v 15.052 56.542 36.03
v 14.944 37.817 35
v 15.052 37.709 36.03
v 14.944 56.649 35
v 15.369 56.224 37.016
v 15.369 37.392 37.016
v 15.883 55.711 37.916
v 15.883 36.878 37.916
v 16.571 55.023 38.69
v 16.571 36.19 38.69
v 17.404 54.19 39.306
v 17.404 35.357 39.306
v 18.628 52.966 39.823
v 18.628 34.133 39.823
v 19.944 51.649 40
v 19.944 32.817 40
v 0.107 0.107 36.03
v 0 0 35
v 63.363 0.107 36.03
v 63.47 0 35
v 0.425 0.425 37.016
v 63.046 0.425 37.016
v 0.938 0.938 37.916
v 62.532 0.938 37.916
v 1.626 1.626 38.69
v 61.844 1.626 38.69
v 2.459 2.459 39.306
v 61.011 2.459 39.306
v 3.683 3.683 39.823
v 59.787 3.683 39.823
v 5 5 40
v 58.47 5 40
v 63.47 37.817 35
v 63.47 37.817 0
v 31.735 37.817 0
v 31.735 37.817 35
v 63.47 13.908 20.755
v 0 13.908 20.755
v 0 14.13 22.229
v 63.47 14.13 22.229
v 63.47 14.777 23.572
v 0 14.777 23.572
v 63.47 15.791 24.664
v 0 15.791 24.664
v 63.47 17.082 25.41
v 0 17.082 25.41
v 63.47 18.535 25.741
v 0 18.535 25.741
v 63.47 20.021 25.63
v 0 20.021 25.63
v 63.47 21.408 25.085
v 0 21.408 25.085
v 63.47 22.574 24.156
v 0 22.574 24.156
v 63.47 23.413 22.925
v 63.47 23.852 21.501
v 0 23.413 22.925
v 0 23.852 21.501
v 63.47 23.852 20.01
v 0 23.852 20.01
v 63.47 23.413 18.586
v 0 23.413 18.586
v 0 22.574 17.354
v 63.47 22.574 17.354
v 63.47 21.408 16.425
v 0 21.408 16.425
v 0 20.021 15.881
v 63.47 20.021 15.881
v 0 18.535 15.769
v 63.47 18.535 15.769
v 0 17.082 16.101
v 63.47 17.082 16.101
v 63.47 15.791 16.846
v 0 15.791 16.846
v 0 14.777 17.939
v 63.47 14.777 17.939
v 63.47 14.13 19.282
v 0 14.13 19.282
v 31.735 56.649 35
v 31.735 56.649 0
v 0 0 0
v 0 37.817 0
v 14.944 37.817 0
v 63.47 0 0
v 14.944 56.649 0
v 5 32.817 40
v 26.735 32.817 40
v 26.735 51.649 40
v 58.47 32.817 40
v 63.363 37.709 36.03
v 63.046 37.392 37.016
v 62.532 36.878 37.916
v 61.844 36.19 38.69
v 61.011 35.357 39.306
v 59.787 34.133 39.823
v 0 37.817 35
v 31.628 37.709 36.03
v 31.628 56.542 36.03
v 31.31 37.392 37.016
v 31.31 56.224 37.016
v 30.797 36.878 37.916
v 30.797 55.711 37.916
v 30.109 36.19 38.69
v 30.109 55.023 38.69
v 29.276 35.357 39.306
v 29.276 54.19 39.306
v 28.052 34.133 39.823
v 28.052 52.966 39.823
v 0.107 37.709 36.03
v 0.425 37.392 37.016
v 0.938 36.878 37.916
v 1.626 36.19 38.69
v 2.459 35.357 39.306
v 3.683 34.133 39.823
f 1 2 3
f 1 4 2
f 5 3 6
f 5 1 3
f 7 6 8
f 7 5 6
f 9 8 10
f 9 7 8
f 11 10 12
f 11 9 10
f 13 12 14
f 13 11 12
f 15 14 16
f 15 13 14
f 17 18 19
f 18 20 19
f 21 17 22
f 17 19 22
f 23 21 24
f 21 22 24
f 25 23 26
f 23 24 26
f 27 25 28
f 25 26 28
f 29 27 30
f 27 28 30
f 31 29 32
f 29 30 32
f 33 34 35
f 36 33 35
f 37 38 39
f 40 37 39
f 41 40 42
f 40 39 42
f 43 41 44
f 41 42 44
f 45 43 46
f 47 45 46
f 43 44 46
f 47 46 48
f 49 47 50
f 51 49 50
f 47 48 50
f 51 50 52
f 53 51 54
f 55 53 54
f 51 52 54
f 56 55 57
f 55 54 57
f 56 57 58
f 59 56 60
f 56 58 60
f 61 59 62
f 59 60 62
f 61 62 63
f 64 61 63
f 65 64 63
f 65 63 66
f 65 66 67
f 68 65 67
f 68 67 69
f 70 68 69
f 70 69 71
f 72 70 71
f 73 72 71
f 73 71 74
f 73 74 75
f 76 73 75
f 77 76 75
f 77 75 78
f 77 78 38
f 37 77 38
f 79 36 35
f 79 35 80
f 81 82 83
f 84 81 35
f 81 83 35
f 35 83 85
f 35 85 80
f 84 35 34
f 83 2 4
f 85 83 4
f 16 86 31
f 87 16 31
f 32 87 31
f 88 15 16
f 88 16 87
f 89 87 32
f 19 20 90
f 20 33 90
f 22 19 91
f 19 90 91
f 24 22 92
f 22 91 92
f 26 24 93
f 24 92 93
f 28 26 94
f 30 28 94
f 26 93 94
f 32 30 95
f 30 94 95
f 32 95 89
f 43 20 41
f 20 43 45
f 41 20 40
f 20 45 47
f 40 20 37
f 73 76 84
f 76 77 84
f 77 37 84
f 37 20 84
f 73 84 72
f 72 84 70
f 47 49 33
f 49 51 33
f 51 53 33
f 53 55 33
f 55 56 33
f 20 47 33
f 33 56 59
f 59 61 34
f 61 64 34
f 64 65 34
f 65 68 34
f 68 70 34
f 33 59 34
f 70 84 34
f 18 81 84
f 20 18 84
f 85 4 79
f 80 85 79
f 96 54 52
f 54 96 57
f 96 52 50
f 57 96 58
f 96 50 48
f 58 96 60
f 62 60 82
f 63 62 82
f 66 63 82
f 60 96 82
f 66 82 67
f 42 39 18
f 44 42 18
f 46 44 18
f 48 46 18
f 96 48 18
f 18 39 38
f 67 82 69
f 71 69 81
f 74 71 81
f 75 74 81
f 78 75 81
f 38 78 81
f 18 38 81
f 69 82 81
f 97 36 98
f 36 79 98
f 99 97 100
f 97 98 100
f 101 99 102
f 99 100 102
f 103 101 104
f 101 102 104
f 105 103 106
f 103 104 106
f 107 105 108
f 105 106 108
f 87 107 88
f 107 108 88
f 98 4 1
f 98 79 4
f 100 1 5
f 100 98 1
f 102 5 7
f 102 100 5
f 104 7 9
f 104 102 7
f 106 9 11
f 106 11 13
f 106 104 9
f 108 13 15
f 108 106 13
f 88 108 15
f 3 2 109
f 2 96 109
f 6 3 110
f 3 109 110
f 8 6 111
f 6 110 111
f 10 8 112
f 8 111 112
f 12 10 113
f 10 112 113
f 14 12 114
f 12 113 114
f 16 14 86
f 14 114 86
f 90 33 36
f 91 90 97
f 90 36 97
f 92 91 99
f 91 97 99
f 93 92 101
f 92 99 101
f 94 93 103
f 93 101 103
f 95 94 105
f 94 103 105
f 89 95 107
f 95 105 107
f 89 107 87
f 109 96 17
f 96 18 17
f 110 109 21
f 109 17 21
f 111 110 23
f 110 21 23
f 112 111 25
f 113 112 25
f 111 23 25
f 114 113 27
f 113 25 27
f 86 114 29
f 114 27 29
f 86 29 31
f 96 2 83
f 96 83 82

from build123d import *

# Parameters (mm, degrees)
F0_W     = 16.7905660346
F0_H     = 18.8323240727
F1_DEPTH = 40
F2_R     = 5
F4_D     = 10


with BuildPart() as f1:
    # F0 (on Top) → F1 (new body)
    with BuildSketch(Plane.XY):
        with Locations((23.3397786506, 47.2326790914)):
            Rectangle(F0_W, F0_H)
        Polygon((0, 37.816517055), (0, 0), (63.4701233357, 0), (63.4701233357, 37.816517055), (31.7350616679, 37.816517055), (14.9444956332, 37.816517055), align=None)
    extrude(amount=F1_DEPTH)

    # F2
    f2_edges = [f1.edges().sort_by_distance(p)[0] for p in [
        (31.735062, 47.232679, 40),
        (23.339779, 56.648841, 40),
        (31.735062, 0, 40),
        (0, 18.908259, 40),
        (47.602593, 37.816517, 40),
        (63.470123, 18.908259, 40),
        (14.944496, 47.232679, 40),
        (7.472248, 37.816517, 40),
    ]]
    fillet(f2_edges, radius=F2_R)

    # F4 (through all)
    with Locations(Plane.YZ.offset(63.4701233357)):
        with Locations((18.9082585275, 20.7553303242)):
            Hole(F4_D / 2)


solid = f1.part
